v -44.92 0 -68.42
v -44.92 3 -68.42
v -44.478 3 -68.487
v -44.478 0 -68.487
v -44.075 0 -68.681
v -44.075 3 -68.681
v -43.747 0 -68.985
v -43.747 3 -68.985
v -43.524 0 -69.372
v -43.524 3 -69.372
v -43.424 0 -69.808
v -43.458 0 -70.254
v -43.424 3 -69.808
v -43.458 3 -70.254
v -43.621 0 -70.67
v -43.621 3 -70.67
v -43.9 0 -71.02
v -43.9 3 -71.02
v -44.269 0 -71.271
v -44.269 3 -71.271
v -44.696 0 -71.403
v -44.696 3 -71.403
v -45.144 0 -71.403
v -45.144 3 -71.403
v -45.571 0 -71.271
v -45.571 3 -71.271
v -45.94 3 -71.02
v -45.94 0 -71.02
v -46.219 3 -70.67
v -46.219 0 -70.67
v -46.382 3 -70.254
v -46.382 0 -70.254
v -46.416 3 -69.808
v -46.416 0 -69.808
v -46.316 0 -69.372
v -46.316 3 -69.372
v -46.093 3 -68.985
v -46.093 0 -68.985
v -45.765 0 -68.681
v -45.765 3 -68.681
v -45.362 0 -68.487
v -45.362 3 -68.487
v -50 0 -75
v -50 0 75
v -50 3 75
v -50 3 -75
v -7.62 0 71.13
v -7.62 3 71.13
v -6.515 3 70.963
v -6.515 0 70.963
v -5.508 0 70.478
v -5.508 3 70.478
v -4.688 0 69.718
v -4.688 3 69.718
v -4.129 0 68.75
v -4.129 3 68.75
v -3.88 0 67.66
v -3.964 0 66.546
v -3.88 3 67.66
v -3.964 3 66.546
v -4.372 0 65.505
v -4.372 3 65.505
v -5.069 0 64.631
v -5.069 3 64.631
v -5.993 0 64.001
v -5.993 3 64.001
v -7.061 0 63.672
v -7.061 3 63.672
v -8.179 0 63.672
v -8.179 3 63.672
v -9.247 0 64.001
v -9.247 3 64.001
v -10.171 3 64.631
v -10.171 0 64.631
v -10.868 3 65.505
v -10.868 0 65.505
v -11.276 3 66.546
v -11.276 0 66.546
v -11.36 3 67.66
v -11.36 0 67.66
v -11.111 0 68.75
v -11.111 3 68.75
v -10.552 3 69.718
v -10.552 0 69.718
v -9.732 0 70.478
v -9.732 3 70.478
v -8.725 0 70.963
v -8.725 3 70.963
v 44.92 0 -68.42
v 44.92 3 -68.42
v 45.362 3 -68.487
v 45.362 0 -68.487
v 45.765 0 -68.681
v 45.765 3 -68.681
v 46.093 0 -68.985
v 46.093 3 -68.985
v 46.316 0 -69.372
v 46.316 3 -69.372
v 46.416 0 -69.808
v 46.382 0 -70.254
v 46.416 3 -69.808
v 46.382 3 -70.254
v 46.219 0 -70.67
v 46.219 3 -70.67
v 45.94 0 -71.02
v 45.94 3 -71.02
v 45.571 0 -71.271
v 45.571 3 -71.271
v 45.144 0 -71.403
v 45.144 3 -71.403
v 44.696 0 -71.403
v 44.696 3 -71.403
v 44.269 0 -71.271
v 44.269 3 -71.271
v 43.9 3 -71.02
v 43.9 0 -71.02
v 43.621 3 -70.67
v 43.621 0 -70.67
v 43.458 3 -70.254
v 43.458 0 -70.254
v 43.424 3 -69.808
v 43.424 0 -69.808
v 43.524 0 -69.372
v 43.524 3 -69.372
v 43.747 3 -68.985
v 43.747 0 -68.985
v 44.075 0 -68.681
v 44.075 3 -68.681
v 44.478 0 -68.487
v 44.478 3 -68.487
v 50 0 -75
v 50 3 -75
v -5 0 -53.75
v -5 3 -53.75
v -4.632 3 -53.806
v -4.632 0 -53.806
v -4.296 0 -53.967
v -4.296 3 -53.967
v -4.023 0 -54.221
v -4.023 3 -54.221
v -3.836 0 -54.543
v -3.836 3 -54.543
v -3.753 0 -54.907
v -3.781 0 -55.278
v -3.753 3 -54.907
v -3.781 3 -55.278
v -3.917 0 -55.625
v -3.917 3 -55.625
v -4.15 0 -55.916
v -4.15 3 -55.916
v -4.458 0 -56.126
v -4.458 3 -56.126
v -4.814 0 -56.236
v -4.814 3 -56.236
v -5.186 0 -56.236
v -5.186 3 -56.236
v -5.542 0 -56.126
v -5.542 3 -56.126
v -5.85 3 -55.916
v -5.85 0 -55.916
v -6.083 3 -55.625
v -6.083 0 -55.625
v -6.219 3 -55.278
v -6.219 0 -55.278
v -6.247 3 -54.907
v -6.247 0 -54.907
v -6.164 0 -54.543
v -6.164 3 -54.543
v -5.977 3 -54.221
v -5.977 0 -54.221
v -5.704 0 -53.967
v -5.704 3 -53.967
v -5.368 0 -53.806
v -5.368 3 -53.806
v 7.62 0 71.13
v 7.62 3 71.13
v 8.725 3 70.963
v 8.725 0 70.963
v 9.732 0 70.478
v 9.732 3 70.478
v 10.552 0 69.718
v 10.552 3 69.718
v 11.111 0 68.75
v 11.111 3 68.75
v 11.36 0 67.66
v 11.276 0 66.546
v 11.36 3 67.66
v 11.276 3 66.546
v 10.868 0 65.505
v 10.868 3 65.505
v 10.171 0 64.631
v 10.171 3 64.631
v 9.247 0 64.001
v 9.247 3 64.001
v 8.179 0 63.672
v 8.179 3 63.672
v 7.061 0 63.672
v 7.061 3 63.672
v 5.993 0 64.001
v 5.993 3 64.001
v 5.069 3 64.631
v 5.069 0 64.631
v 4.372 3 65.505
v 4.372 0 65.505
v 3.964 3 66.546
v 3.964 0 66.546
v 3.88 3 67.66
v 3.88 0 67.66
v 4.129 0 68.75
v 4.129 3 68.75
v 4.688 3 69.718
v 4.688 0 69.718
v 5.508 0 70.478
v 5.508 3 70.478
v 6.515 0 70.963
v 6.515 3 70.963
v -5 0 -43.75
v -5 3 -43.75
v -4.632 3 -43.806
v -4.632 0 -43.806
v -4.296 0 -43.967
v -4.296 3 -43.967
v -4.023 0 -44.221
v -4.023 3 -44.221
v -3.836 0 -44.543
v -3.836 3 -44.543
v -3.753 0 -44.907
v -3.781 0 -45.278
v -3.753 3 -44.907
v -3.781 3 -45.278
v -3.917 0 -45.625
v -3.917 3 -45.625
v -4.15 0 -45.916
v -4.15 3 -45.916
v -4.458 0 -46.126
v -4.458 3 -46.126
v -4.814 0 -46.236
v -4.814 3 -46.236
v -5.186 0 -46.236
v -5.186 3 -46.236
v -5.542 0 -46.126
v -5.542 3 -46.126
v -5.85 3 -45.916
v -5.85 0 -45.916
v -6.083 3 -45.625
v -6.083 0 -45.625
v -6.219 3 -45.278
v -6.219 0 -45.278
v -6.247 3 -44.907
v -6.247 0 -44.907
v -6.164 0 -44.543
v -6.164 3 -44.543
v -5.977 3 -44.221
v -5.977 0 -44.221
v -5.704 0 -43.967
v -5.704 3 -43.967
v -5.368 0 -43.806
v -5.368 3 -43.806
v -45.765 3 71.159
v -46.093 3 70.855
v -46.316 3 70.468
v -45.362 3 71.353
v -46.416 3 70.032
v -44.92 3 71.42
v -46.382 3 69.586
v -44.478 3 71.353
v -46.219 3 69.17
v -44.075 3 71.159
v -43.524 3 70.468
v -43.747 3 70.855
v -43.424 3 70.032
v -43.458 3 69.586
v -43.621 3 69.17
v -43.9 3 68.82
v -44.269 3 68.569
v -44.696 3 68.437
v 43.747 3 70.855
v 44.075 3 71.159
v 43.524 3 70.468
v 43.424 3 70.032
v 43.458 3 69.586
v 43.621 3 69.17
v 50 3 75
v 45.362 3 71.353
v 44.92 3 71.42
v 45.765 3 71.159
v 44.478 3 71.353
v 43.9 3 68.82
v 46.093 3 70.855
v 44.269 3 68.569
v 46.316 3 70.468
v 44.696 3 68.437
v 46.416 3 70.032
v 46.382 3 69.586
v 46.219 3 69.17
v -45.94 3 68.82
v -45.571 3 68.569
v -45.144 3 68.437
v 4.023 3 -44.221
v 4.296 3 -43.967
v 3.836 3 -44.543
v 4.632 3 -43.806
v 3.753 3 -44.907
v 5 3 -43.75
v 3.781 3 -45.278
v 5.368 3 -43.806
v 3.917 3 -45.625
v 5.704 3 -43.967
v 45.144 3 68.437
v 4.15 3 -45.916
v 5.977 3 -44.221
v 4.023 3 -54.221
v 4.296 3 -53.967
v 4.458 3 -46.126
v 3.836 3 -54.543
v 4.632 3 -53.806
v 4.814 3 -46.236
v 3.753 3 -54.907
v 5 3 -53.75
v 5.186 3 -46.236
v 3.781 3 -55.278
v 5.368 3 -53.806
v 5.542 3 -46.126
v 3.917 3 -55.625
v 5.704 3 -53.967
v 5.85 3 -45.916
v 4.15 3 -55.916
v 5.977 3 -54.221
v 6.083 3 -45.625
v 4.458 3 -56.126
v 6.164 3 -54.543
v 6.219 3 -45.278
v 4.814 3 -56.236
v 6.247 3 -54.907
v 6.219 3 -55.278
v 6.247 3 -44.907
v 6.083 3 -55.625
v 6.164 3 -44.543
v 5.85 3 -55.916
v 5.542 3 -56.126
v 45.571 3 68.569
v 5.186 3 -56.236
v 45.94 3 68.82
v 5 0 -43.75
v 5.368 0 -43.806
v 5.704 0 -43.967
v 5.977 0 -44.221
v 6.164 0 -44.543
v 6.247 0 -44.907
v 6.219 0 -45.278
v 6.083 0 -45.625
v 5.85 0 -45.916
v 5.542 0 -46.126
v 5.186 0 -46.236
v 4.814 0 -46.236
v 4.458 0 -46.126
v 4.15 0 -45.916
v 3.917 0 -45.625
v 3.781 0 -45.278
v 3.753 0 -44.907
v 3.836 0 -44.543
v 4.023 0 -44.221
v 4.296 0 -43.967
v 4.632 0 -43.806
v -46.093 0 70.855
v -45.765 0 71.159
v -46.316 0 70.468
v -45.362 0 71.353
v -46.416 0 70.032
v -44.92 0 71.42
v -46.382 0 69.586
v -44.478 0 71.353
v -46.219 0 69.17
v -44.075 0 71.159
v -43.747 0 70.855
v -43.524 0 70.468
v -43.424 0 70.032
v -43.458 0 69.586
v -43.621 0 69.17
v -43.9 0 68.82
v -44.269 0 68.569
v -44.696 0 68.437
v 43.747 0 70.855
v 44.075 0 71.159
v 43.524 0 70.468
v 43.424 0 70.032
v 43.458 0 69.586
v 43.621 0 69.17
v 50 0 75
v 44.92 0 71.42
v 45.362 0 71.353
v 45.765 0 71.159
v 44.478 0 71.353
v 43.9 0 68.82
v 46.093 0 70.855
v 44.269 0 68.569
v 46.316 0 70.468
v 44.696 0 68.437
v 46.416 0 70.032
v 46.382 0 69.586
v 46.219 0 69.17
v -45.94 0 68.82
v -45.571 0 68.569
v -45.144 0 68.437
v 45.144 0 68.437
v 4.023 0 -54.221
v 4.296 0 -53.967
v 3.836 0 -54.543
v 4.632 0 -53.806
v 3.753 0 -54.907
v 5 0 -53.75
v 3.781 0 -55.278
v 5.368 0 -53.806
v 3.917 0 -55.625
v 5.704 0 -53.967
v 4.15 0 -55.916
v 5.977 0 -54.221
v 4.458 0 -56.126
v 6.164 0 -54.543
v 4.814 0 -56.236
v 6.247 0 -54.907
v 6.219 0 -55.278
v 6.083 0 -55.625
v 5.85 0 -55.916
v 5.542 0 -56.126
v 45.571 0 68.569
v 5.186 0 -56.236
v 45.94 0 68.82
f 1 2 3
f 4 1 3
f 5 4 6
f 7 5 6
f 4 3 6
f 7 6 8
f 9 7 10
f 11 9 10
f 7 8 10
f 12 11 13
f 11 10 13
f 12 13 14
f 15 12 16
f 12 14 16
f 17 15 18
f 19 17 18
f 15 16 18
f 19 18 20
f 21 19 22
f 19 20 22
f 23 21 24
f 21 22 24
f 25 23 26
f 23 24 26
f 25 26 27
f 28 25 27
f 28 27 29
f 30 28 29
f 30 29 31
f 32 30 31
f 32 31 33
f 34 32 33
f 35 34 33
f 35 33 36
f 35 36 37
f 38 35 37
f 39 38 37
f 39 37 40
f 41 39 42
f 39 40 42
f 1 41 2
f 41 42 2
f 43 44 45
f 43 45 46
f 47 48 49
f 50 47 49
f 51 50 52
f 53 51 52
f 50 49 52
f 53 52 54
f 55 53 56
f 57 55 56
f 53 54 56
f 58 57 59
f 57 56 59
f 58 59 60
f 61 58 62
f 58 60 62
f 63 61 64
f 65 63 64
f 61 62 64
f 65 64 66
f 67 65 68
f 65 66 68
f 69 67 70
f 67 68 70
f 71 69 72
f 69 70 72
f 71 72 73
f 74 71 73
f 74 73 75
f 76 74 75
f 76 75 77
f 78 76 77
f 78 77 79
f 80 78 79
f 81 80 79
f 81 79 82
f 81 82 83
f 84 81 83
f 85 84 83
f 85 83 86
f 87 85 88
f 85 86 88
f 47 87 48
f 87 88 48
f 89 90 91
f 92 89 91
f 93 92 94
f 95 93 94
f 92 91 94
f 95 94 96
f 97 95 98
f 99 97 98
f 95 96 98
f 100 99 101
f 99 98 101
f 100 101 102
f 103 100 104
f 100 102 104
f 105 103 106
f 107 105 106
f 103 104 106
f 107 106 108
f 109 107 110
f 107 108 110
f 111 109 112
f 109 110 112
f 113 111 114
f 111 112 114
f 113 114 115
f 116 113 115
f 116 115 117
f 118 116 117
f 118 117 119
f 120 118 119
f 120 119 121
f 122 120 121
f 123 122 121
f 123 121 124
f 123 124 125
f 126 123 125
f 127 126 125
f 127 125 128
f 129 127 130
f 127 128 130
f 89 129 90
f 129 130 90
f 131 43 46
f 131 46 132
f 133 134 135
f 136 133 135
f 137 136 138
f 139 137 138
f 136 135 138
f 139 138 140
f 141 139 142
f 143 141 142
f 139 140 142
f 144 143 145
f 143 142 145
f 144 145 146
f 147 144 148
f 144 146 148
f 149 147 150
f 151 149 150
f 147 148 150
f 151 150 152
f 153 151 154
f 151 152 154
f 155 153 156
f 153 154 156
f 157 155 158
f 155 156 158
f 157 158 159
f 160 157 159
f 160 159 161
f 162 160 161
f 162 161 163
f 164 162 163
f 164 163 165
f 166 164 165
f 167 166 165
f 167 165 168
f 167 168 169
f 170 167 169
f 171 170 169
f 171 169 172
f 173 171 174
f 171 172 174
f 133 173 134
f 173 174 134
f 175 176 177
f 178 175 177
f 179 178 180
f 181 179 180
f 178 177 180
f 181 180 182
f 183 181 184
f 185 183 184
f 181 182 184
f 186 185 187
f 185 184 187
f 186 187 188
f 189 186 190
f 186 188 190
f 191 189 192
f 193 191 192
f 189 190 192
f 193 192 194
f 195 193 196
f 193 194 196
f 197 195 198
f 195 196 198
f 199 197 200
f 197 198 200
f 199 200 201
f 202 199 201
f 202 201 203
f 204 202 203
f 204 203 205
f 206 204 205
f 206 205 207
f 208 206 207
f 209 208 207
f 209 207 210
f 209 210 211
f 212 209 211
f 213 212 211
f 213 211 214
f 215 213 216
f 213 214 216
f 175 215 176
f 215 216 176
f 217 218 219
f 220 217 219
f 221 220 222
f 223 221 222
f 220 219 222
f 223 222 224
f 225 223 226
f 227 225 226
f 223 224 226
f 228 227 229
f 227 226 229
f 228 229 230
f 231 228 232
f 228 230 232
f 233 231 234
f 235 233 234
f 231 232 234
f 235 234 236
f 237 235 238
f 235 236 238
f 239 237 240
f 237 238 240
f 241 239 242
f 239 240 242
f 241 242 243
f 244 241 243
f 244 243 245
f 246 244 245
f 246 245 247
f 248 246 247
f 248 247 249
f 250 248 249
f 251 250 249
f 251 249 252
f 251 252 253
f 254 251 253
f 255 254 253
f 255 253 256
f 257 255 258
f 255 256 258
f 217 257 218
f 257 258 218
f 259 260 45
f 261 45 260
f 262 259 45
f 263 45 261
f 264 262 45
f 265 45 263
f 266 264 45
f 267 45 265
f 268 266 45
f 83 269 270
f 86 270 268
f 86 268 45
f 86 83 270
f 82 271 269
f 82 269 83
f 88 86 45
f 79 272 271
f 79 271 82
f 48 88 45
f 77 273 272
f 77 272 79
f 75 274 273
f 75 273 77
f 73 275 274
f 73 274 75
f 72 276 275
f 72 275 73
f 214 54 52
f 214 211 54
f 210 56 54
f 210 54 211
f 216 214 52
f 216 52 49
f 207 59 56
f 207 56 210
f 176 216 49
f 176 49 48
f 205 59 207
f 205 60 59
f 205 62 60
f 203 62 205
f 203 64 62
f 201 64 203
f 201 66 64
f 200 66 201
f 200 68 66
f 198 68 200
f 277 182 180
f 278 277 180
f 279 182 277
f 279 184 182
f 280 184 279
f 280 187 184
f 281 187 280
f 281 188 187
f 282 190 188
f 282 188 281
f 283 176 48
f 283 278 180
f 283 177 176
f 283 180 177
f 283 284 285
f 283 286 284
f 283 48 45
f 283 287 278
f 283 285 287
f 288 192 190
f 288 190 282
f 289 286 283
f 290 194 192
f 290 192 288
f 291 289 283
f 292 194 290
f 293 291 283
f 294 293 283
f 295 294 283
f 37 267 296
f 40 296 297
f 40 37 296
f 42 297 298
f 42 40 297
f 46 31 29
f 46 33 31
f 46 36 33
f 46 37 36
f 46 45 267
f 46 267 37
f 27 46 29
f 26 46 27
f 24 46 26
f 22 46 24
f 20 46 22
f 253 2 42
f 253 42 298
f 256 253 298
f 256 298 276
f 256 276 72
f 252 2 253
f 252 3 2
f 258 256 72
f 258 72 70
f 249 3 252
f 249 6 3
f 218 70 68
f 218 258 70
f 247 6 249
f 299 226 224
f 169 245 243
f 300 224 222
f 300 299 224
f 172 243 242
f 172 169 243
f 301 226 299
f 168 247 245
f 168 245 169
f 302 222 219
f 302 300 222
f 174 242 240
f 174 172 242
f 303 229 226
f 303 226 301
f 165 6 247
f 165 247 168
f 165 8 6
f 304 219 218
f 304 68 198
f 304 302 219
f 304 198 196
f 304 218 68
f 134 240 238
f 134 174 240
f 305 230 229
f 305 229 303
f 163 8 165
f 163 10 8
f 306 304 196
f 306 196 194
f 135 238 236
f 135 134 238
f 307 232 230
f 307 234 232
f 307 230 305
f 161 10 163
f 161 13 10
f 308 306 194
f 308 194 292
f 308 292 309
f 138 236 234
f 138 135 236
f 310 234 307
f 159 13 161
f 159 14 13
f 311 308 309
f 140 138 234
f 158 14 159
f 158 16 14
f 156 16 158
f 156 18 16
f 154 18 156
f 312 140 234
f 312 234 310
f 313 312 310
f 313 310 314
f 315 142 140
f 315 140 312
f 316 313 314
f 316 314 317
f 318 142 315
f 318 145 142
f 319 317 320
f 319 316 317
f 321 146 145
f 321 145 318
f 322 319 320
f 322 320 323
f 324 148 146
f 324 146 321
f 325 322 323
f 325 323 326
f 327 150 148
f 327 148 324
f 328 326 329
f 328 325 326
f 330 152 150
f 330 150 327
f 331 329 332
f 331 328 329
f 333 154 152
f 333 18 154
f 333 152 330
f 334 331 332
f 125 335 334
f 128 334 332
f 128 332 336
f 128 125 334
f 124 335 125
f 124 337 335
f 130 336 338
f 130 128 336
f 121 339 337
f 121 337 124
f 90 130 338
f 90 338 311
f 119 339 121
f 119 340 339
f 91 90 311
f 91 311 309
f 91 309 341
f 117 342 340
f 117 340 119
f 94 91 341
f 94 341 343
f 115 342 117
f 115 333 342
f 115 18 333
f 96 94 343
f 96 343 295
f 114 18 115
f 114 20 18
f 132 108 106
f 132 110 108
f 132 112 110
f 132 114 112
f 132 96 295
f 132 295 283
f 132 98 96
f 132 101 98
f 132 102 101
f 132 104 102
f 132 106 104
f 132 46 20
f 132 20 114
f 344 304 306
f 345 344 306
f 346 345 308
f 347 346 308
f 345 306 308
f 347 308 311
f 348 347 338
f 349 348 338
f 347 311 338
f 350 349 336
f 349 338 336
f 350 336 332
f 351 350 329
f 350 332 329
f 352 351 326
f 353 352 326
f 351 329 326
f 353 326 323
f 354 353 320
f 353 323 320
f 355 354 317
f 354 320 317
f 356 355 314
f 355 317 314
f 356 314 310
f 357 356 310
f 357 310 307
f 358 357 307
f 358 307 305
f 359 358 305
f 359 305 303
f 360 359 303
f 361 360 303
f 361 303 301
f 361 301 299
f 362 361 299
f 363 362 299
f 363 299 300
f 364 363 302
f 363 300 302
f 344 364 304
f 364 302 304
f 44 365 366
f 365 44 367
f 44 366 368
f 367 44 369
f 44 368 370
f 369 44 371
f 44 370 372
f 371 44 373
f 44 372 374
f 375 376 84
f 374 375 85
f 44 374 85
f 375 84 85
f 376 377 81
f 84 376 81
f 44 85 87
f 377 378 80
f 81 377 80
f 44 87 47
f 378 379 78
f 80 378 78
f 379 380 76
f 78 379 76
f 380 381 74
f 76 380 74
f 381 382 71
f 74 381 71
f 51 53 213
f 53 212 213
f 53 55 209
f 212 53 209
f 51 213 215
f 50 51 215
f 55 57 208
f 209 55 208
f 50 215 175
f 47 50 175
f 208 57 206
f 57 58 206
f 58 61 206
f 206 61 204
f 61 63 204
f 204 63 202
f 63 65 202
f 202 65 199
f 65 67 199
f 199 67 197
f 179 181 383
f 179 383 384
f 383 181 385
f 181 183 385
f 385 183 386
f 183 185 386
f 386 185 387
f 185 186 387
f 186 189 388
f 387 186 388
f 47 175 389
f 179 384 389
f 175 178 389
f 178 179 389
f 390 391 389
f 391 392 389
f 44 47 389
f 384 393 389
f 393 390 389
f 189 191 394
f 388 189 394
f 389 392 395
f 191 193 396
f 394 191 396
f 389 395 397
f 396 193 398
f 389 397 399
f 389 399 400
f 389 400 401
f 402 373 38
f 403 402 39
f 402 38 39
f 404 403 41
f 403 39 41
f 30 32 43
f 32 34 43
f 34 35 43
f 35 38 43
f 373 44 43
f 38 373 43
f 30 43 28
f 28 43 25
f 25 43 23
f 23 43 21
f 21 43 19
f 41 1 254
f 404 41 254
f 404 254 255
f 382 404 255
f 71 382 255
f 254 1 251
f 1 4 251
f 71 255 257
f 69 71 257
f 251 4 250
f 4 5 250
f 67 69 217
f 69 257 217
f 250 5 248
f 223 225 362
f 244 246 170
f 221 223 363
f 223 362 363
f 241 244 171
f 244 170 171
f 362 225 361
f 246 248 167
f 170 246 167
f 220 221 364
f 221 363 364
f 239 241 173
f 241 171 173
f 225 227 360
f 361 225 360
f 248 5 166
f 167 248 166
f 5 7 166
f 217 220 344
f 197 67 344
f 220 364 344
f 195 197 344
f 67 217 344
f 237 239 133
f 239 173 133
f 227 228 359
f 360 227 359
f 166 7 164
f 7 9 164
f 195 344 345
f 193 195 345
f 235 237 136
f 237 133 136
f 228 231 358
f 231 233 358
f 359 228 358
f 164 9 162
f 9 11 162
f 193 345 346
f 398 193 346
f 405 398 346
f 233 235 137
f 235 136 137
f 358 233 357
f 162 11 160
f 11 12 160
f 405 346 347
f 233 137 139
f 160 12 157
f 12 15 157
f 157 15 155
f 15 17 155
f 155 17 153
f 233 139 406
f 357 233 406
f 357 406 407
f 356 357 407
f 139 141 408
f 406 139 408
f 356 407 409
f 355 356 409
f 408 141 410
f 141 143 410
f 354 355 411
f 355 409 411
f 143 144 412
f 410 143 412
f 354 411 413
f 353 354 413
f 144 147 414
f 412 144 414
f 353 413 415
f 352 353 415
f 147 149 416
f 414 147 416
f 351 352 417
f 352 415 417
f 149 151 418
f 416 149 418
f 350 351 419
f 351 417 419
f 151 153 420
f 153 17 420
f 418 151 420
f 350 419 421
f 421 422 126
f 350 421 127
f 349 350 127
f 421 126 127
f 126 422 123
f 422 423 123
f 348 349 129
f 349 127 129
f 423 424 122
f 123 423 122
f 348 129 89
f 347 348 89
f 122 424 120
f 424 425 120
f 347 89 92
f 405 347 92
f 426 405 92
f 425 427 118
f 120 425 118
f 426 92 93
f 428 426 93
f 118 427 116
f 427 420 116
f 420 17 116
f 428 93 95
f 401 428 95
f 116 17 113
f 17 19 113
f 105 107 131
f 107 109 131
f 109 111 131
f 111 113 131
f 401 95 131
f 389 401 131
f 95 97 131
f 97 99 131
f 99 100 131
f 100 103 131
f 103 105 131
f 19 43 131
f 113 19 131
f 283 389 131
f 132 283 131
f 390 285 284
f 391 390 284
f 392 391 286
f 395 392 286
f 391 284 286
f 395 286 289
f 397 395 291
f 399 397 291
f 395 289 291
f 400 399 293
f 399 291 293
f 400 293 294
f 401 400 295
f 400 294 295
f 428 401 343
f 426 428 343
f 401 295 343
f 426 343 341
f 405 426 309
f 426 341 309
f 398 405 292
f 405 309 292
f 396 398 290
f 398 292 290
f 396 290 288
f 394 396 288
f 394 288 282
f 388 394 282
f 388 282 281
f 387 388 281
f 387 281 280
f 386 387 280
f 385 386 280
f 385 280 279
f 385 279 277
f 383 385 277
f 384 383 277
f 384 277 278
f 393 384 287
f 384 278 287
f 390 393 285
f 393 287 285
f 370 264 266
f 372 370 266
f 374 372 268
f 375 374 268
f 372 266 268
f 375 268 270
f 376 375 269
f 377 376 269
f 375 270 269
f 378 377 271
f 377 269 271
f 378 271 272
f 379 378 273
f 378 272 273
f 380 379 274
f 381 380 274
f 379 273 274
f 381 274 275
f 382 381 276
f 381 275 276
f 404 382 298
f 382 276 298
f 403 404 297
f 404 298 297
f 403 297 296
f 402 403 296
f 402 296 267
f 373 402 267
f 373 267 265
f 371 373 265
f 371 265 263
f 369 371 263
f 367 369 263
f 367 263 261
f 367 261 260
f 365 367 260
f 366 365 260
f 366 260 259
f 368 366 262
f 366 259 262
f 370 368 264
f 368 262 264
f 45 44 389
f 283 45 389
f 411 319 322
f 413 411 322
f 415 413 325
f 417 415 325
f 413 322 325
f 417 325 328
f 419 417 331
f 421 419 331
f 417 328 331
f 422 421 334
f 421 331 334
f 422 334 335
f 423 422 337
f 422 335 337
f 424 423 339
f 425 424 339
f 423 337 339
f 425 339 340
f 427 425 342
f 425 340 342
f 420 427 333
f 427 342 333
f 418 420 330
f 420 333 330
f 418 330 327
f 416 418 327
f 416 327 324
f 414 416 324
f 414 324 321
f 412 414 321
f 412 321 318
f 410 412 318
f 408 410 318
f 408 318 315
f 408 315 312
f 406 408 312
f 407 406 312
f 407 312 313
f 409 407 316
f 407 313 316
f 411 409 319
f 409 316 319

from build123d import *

# Parameters (mm, degrees)
SKETCH1_W           = 99.999999898
SKETCH1_H           = 149.999999974
BOSS_EXTRUDE1_DEPTH = 3
SKETCH2_R           = 3.749999993
SKETCH2_R_2         = 1.500000048
SKETCH2_R_3         = 1.5
SKETCH2_R_4         = 1.25
CUT_EXTRUDE1_DEPTH  = 3


with BuildPart() as part:
    # Sketch1 → Boss-Extrude1 (new body)
    with BuildSketch(Plane(origin=(0, 0, 0), x_dir=(1, 0, 0), z_dir=(0, 1, 0))):
        Rectangle(SKETCH1_W, SKETCH1_H)
    extrude(amount=BOSS_EXTRUDE1_DEPTH)

    # Sketch2 → Cut-Extrude1 (cut)
    with BuildSketch(Plane(origin=(0, 3, 0), x_dir=(1, 0, 0), z_dir=(0, 1, 0))):
        with Locations(Location((-7.62, -67.379999987, 0), (0, 0, 270))):
            Circle(SKETCH2_R)
        with Locations(Location((7.62, -67.379999987, 0), (0, 0, 270))):
            Circle(SKETCH2_R)
        with Locations(Location((-44.919999949, 69.919999987, 0), (0, 0, 270))):
            Circle(SKETCH2_R_2)
        with Locations(Location((44.919999949, 69.919999987, 0), (0, 0, 270))):
            Circle(SKETCH2_R_3)
        with Locations(Location((-44.919999949, -69.919999987, 0), (0, 0, 270))):
            Circle(SKETCH2_R_3)
        with Locations(Location((44.919999949, -69.919999987, 0), (0, 0, 270))):
            Circle(SKETCH2_R_3)
        with Locations(Location((-4.999999906, 55.000000109, 0), (0, 0, 270))):
            Circle(SKETCH2_R_4)
        with Locations(Location((4.999999906, 55.000000109, 0), (0, 0, 270))):
            Circle(SKETCH2_R_4)
        with Locations(Location((-4.999999906, 45.000000109, 0), (0, 0, 270))):
            Circle(SKETCH2_R_4)
        with Locations(Location((4.999999906, 45.000000109, 0), (0, 0, 270))):
            Circle(SKETCH2_R_4)
    extrude(amount=-CUT_EXTRUDE1_DEPTH, mode=Mode.SUBTRACT)


solid = part.part
